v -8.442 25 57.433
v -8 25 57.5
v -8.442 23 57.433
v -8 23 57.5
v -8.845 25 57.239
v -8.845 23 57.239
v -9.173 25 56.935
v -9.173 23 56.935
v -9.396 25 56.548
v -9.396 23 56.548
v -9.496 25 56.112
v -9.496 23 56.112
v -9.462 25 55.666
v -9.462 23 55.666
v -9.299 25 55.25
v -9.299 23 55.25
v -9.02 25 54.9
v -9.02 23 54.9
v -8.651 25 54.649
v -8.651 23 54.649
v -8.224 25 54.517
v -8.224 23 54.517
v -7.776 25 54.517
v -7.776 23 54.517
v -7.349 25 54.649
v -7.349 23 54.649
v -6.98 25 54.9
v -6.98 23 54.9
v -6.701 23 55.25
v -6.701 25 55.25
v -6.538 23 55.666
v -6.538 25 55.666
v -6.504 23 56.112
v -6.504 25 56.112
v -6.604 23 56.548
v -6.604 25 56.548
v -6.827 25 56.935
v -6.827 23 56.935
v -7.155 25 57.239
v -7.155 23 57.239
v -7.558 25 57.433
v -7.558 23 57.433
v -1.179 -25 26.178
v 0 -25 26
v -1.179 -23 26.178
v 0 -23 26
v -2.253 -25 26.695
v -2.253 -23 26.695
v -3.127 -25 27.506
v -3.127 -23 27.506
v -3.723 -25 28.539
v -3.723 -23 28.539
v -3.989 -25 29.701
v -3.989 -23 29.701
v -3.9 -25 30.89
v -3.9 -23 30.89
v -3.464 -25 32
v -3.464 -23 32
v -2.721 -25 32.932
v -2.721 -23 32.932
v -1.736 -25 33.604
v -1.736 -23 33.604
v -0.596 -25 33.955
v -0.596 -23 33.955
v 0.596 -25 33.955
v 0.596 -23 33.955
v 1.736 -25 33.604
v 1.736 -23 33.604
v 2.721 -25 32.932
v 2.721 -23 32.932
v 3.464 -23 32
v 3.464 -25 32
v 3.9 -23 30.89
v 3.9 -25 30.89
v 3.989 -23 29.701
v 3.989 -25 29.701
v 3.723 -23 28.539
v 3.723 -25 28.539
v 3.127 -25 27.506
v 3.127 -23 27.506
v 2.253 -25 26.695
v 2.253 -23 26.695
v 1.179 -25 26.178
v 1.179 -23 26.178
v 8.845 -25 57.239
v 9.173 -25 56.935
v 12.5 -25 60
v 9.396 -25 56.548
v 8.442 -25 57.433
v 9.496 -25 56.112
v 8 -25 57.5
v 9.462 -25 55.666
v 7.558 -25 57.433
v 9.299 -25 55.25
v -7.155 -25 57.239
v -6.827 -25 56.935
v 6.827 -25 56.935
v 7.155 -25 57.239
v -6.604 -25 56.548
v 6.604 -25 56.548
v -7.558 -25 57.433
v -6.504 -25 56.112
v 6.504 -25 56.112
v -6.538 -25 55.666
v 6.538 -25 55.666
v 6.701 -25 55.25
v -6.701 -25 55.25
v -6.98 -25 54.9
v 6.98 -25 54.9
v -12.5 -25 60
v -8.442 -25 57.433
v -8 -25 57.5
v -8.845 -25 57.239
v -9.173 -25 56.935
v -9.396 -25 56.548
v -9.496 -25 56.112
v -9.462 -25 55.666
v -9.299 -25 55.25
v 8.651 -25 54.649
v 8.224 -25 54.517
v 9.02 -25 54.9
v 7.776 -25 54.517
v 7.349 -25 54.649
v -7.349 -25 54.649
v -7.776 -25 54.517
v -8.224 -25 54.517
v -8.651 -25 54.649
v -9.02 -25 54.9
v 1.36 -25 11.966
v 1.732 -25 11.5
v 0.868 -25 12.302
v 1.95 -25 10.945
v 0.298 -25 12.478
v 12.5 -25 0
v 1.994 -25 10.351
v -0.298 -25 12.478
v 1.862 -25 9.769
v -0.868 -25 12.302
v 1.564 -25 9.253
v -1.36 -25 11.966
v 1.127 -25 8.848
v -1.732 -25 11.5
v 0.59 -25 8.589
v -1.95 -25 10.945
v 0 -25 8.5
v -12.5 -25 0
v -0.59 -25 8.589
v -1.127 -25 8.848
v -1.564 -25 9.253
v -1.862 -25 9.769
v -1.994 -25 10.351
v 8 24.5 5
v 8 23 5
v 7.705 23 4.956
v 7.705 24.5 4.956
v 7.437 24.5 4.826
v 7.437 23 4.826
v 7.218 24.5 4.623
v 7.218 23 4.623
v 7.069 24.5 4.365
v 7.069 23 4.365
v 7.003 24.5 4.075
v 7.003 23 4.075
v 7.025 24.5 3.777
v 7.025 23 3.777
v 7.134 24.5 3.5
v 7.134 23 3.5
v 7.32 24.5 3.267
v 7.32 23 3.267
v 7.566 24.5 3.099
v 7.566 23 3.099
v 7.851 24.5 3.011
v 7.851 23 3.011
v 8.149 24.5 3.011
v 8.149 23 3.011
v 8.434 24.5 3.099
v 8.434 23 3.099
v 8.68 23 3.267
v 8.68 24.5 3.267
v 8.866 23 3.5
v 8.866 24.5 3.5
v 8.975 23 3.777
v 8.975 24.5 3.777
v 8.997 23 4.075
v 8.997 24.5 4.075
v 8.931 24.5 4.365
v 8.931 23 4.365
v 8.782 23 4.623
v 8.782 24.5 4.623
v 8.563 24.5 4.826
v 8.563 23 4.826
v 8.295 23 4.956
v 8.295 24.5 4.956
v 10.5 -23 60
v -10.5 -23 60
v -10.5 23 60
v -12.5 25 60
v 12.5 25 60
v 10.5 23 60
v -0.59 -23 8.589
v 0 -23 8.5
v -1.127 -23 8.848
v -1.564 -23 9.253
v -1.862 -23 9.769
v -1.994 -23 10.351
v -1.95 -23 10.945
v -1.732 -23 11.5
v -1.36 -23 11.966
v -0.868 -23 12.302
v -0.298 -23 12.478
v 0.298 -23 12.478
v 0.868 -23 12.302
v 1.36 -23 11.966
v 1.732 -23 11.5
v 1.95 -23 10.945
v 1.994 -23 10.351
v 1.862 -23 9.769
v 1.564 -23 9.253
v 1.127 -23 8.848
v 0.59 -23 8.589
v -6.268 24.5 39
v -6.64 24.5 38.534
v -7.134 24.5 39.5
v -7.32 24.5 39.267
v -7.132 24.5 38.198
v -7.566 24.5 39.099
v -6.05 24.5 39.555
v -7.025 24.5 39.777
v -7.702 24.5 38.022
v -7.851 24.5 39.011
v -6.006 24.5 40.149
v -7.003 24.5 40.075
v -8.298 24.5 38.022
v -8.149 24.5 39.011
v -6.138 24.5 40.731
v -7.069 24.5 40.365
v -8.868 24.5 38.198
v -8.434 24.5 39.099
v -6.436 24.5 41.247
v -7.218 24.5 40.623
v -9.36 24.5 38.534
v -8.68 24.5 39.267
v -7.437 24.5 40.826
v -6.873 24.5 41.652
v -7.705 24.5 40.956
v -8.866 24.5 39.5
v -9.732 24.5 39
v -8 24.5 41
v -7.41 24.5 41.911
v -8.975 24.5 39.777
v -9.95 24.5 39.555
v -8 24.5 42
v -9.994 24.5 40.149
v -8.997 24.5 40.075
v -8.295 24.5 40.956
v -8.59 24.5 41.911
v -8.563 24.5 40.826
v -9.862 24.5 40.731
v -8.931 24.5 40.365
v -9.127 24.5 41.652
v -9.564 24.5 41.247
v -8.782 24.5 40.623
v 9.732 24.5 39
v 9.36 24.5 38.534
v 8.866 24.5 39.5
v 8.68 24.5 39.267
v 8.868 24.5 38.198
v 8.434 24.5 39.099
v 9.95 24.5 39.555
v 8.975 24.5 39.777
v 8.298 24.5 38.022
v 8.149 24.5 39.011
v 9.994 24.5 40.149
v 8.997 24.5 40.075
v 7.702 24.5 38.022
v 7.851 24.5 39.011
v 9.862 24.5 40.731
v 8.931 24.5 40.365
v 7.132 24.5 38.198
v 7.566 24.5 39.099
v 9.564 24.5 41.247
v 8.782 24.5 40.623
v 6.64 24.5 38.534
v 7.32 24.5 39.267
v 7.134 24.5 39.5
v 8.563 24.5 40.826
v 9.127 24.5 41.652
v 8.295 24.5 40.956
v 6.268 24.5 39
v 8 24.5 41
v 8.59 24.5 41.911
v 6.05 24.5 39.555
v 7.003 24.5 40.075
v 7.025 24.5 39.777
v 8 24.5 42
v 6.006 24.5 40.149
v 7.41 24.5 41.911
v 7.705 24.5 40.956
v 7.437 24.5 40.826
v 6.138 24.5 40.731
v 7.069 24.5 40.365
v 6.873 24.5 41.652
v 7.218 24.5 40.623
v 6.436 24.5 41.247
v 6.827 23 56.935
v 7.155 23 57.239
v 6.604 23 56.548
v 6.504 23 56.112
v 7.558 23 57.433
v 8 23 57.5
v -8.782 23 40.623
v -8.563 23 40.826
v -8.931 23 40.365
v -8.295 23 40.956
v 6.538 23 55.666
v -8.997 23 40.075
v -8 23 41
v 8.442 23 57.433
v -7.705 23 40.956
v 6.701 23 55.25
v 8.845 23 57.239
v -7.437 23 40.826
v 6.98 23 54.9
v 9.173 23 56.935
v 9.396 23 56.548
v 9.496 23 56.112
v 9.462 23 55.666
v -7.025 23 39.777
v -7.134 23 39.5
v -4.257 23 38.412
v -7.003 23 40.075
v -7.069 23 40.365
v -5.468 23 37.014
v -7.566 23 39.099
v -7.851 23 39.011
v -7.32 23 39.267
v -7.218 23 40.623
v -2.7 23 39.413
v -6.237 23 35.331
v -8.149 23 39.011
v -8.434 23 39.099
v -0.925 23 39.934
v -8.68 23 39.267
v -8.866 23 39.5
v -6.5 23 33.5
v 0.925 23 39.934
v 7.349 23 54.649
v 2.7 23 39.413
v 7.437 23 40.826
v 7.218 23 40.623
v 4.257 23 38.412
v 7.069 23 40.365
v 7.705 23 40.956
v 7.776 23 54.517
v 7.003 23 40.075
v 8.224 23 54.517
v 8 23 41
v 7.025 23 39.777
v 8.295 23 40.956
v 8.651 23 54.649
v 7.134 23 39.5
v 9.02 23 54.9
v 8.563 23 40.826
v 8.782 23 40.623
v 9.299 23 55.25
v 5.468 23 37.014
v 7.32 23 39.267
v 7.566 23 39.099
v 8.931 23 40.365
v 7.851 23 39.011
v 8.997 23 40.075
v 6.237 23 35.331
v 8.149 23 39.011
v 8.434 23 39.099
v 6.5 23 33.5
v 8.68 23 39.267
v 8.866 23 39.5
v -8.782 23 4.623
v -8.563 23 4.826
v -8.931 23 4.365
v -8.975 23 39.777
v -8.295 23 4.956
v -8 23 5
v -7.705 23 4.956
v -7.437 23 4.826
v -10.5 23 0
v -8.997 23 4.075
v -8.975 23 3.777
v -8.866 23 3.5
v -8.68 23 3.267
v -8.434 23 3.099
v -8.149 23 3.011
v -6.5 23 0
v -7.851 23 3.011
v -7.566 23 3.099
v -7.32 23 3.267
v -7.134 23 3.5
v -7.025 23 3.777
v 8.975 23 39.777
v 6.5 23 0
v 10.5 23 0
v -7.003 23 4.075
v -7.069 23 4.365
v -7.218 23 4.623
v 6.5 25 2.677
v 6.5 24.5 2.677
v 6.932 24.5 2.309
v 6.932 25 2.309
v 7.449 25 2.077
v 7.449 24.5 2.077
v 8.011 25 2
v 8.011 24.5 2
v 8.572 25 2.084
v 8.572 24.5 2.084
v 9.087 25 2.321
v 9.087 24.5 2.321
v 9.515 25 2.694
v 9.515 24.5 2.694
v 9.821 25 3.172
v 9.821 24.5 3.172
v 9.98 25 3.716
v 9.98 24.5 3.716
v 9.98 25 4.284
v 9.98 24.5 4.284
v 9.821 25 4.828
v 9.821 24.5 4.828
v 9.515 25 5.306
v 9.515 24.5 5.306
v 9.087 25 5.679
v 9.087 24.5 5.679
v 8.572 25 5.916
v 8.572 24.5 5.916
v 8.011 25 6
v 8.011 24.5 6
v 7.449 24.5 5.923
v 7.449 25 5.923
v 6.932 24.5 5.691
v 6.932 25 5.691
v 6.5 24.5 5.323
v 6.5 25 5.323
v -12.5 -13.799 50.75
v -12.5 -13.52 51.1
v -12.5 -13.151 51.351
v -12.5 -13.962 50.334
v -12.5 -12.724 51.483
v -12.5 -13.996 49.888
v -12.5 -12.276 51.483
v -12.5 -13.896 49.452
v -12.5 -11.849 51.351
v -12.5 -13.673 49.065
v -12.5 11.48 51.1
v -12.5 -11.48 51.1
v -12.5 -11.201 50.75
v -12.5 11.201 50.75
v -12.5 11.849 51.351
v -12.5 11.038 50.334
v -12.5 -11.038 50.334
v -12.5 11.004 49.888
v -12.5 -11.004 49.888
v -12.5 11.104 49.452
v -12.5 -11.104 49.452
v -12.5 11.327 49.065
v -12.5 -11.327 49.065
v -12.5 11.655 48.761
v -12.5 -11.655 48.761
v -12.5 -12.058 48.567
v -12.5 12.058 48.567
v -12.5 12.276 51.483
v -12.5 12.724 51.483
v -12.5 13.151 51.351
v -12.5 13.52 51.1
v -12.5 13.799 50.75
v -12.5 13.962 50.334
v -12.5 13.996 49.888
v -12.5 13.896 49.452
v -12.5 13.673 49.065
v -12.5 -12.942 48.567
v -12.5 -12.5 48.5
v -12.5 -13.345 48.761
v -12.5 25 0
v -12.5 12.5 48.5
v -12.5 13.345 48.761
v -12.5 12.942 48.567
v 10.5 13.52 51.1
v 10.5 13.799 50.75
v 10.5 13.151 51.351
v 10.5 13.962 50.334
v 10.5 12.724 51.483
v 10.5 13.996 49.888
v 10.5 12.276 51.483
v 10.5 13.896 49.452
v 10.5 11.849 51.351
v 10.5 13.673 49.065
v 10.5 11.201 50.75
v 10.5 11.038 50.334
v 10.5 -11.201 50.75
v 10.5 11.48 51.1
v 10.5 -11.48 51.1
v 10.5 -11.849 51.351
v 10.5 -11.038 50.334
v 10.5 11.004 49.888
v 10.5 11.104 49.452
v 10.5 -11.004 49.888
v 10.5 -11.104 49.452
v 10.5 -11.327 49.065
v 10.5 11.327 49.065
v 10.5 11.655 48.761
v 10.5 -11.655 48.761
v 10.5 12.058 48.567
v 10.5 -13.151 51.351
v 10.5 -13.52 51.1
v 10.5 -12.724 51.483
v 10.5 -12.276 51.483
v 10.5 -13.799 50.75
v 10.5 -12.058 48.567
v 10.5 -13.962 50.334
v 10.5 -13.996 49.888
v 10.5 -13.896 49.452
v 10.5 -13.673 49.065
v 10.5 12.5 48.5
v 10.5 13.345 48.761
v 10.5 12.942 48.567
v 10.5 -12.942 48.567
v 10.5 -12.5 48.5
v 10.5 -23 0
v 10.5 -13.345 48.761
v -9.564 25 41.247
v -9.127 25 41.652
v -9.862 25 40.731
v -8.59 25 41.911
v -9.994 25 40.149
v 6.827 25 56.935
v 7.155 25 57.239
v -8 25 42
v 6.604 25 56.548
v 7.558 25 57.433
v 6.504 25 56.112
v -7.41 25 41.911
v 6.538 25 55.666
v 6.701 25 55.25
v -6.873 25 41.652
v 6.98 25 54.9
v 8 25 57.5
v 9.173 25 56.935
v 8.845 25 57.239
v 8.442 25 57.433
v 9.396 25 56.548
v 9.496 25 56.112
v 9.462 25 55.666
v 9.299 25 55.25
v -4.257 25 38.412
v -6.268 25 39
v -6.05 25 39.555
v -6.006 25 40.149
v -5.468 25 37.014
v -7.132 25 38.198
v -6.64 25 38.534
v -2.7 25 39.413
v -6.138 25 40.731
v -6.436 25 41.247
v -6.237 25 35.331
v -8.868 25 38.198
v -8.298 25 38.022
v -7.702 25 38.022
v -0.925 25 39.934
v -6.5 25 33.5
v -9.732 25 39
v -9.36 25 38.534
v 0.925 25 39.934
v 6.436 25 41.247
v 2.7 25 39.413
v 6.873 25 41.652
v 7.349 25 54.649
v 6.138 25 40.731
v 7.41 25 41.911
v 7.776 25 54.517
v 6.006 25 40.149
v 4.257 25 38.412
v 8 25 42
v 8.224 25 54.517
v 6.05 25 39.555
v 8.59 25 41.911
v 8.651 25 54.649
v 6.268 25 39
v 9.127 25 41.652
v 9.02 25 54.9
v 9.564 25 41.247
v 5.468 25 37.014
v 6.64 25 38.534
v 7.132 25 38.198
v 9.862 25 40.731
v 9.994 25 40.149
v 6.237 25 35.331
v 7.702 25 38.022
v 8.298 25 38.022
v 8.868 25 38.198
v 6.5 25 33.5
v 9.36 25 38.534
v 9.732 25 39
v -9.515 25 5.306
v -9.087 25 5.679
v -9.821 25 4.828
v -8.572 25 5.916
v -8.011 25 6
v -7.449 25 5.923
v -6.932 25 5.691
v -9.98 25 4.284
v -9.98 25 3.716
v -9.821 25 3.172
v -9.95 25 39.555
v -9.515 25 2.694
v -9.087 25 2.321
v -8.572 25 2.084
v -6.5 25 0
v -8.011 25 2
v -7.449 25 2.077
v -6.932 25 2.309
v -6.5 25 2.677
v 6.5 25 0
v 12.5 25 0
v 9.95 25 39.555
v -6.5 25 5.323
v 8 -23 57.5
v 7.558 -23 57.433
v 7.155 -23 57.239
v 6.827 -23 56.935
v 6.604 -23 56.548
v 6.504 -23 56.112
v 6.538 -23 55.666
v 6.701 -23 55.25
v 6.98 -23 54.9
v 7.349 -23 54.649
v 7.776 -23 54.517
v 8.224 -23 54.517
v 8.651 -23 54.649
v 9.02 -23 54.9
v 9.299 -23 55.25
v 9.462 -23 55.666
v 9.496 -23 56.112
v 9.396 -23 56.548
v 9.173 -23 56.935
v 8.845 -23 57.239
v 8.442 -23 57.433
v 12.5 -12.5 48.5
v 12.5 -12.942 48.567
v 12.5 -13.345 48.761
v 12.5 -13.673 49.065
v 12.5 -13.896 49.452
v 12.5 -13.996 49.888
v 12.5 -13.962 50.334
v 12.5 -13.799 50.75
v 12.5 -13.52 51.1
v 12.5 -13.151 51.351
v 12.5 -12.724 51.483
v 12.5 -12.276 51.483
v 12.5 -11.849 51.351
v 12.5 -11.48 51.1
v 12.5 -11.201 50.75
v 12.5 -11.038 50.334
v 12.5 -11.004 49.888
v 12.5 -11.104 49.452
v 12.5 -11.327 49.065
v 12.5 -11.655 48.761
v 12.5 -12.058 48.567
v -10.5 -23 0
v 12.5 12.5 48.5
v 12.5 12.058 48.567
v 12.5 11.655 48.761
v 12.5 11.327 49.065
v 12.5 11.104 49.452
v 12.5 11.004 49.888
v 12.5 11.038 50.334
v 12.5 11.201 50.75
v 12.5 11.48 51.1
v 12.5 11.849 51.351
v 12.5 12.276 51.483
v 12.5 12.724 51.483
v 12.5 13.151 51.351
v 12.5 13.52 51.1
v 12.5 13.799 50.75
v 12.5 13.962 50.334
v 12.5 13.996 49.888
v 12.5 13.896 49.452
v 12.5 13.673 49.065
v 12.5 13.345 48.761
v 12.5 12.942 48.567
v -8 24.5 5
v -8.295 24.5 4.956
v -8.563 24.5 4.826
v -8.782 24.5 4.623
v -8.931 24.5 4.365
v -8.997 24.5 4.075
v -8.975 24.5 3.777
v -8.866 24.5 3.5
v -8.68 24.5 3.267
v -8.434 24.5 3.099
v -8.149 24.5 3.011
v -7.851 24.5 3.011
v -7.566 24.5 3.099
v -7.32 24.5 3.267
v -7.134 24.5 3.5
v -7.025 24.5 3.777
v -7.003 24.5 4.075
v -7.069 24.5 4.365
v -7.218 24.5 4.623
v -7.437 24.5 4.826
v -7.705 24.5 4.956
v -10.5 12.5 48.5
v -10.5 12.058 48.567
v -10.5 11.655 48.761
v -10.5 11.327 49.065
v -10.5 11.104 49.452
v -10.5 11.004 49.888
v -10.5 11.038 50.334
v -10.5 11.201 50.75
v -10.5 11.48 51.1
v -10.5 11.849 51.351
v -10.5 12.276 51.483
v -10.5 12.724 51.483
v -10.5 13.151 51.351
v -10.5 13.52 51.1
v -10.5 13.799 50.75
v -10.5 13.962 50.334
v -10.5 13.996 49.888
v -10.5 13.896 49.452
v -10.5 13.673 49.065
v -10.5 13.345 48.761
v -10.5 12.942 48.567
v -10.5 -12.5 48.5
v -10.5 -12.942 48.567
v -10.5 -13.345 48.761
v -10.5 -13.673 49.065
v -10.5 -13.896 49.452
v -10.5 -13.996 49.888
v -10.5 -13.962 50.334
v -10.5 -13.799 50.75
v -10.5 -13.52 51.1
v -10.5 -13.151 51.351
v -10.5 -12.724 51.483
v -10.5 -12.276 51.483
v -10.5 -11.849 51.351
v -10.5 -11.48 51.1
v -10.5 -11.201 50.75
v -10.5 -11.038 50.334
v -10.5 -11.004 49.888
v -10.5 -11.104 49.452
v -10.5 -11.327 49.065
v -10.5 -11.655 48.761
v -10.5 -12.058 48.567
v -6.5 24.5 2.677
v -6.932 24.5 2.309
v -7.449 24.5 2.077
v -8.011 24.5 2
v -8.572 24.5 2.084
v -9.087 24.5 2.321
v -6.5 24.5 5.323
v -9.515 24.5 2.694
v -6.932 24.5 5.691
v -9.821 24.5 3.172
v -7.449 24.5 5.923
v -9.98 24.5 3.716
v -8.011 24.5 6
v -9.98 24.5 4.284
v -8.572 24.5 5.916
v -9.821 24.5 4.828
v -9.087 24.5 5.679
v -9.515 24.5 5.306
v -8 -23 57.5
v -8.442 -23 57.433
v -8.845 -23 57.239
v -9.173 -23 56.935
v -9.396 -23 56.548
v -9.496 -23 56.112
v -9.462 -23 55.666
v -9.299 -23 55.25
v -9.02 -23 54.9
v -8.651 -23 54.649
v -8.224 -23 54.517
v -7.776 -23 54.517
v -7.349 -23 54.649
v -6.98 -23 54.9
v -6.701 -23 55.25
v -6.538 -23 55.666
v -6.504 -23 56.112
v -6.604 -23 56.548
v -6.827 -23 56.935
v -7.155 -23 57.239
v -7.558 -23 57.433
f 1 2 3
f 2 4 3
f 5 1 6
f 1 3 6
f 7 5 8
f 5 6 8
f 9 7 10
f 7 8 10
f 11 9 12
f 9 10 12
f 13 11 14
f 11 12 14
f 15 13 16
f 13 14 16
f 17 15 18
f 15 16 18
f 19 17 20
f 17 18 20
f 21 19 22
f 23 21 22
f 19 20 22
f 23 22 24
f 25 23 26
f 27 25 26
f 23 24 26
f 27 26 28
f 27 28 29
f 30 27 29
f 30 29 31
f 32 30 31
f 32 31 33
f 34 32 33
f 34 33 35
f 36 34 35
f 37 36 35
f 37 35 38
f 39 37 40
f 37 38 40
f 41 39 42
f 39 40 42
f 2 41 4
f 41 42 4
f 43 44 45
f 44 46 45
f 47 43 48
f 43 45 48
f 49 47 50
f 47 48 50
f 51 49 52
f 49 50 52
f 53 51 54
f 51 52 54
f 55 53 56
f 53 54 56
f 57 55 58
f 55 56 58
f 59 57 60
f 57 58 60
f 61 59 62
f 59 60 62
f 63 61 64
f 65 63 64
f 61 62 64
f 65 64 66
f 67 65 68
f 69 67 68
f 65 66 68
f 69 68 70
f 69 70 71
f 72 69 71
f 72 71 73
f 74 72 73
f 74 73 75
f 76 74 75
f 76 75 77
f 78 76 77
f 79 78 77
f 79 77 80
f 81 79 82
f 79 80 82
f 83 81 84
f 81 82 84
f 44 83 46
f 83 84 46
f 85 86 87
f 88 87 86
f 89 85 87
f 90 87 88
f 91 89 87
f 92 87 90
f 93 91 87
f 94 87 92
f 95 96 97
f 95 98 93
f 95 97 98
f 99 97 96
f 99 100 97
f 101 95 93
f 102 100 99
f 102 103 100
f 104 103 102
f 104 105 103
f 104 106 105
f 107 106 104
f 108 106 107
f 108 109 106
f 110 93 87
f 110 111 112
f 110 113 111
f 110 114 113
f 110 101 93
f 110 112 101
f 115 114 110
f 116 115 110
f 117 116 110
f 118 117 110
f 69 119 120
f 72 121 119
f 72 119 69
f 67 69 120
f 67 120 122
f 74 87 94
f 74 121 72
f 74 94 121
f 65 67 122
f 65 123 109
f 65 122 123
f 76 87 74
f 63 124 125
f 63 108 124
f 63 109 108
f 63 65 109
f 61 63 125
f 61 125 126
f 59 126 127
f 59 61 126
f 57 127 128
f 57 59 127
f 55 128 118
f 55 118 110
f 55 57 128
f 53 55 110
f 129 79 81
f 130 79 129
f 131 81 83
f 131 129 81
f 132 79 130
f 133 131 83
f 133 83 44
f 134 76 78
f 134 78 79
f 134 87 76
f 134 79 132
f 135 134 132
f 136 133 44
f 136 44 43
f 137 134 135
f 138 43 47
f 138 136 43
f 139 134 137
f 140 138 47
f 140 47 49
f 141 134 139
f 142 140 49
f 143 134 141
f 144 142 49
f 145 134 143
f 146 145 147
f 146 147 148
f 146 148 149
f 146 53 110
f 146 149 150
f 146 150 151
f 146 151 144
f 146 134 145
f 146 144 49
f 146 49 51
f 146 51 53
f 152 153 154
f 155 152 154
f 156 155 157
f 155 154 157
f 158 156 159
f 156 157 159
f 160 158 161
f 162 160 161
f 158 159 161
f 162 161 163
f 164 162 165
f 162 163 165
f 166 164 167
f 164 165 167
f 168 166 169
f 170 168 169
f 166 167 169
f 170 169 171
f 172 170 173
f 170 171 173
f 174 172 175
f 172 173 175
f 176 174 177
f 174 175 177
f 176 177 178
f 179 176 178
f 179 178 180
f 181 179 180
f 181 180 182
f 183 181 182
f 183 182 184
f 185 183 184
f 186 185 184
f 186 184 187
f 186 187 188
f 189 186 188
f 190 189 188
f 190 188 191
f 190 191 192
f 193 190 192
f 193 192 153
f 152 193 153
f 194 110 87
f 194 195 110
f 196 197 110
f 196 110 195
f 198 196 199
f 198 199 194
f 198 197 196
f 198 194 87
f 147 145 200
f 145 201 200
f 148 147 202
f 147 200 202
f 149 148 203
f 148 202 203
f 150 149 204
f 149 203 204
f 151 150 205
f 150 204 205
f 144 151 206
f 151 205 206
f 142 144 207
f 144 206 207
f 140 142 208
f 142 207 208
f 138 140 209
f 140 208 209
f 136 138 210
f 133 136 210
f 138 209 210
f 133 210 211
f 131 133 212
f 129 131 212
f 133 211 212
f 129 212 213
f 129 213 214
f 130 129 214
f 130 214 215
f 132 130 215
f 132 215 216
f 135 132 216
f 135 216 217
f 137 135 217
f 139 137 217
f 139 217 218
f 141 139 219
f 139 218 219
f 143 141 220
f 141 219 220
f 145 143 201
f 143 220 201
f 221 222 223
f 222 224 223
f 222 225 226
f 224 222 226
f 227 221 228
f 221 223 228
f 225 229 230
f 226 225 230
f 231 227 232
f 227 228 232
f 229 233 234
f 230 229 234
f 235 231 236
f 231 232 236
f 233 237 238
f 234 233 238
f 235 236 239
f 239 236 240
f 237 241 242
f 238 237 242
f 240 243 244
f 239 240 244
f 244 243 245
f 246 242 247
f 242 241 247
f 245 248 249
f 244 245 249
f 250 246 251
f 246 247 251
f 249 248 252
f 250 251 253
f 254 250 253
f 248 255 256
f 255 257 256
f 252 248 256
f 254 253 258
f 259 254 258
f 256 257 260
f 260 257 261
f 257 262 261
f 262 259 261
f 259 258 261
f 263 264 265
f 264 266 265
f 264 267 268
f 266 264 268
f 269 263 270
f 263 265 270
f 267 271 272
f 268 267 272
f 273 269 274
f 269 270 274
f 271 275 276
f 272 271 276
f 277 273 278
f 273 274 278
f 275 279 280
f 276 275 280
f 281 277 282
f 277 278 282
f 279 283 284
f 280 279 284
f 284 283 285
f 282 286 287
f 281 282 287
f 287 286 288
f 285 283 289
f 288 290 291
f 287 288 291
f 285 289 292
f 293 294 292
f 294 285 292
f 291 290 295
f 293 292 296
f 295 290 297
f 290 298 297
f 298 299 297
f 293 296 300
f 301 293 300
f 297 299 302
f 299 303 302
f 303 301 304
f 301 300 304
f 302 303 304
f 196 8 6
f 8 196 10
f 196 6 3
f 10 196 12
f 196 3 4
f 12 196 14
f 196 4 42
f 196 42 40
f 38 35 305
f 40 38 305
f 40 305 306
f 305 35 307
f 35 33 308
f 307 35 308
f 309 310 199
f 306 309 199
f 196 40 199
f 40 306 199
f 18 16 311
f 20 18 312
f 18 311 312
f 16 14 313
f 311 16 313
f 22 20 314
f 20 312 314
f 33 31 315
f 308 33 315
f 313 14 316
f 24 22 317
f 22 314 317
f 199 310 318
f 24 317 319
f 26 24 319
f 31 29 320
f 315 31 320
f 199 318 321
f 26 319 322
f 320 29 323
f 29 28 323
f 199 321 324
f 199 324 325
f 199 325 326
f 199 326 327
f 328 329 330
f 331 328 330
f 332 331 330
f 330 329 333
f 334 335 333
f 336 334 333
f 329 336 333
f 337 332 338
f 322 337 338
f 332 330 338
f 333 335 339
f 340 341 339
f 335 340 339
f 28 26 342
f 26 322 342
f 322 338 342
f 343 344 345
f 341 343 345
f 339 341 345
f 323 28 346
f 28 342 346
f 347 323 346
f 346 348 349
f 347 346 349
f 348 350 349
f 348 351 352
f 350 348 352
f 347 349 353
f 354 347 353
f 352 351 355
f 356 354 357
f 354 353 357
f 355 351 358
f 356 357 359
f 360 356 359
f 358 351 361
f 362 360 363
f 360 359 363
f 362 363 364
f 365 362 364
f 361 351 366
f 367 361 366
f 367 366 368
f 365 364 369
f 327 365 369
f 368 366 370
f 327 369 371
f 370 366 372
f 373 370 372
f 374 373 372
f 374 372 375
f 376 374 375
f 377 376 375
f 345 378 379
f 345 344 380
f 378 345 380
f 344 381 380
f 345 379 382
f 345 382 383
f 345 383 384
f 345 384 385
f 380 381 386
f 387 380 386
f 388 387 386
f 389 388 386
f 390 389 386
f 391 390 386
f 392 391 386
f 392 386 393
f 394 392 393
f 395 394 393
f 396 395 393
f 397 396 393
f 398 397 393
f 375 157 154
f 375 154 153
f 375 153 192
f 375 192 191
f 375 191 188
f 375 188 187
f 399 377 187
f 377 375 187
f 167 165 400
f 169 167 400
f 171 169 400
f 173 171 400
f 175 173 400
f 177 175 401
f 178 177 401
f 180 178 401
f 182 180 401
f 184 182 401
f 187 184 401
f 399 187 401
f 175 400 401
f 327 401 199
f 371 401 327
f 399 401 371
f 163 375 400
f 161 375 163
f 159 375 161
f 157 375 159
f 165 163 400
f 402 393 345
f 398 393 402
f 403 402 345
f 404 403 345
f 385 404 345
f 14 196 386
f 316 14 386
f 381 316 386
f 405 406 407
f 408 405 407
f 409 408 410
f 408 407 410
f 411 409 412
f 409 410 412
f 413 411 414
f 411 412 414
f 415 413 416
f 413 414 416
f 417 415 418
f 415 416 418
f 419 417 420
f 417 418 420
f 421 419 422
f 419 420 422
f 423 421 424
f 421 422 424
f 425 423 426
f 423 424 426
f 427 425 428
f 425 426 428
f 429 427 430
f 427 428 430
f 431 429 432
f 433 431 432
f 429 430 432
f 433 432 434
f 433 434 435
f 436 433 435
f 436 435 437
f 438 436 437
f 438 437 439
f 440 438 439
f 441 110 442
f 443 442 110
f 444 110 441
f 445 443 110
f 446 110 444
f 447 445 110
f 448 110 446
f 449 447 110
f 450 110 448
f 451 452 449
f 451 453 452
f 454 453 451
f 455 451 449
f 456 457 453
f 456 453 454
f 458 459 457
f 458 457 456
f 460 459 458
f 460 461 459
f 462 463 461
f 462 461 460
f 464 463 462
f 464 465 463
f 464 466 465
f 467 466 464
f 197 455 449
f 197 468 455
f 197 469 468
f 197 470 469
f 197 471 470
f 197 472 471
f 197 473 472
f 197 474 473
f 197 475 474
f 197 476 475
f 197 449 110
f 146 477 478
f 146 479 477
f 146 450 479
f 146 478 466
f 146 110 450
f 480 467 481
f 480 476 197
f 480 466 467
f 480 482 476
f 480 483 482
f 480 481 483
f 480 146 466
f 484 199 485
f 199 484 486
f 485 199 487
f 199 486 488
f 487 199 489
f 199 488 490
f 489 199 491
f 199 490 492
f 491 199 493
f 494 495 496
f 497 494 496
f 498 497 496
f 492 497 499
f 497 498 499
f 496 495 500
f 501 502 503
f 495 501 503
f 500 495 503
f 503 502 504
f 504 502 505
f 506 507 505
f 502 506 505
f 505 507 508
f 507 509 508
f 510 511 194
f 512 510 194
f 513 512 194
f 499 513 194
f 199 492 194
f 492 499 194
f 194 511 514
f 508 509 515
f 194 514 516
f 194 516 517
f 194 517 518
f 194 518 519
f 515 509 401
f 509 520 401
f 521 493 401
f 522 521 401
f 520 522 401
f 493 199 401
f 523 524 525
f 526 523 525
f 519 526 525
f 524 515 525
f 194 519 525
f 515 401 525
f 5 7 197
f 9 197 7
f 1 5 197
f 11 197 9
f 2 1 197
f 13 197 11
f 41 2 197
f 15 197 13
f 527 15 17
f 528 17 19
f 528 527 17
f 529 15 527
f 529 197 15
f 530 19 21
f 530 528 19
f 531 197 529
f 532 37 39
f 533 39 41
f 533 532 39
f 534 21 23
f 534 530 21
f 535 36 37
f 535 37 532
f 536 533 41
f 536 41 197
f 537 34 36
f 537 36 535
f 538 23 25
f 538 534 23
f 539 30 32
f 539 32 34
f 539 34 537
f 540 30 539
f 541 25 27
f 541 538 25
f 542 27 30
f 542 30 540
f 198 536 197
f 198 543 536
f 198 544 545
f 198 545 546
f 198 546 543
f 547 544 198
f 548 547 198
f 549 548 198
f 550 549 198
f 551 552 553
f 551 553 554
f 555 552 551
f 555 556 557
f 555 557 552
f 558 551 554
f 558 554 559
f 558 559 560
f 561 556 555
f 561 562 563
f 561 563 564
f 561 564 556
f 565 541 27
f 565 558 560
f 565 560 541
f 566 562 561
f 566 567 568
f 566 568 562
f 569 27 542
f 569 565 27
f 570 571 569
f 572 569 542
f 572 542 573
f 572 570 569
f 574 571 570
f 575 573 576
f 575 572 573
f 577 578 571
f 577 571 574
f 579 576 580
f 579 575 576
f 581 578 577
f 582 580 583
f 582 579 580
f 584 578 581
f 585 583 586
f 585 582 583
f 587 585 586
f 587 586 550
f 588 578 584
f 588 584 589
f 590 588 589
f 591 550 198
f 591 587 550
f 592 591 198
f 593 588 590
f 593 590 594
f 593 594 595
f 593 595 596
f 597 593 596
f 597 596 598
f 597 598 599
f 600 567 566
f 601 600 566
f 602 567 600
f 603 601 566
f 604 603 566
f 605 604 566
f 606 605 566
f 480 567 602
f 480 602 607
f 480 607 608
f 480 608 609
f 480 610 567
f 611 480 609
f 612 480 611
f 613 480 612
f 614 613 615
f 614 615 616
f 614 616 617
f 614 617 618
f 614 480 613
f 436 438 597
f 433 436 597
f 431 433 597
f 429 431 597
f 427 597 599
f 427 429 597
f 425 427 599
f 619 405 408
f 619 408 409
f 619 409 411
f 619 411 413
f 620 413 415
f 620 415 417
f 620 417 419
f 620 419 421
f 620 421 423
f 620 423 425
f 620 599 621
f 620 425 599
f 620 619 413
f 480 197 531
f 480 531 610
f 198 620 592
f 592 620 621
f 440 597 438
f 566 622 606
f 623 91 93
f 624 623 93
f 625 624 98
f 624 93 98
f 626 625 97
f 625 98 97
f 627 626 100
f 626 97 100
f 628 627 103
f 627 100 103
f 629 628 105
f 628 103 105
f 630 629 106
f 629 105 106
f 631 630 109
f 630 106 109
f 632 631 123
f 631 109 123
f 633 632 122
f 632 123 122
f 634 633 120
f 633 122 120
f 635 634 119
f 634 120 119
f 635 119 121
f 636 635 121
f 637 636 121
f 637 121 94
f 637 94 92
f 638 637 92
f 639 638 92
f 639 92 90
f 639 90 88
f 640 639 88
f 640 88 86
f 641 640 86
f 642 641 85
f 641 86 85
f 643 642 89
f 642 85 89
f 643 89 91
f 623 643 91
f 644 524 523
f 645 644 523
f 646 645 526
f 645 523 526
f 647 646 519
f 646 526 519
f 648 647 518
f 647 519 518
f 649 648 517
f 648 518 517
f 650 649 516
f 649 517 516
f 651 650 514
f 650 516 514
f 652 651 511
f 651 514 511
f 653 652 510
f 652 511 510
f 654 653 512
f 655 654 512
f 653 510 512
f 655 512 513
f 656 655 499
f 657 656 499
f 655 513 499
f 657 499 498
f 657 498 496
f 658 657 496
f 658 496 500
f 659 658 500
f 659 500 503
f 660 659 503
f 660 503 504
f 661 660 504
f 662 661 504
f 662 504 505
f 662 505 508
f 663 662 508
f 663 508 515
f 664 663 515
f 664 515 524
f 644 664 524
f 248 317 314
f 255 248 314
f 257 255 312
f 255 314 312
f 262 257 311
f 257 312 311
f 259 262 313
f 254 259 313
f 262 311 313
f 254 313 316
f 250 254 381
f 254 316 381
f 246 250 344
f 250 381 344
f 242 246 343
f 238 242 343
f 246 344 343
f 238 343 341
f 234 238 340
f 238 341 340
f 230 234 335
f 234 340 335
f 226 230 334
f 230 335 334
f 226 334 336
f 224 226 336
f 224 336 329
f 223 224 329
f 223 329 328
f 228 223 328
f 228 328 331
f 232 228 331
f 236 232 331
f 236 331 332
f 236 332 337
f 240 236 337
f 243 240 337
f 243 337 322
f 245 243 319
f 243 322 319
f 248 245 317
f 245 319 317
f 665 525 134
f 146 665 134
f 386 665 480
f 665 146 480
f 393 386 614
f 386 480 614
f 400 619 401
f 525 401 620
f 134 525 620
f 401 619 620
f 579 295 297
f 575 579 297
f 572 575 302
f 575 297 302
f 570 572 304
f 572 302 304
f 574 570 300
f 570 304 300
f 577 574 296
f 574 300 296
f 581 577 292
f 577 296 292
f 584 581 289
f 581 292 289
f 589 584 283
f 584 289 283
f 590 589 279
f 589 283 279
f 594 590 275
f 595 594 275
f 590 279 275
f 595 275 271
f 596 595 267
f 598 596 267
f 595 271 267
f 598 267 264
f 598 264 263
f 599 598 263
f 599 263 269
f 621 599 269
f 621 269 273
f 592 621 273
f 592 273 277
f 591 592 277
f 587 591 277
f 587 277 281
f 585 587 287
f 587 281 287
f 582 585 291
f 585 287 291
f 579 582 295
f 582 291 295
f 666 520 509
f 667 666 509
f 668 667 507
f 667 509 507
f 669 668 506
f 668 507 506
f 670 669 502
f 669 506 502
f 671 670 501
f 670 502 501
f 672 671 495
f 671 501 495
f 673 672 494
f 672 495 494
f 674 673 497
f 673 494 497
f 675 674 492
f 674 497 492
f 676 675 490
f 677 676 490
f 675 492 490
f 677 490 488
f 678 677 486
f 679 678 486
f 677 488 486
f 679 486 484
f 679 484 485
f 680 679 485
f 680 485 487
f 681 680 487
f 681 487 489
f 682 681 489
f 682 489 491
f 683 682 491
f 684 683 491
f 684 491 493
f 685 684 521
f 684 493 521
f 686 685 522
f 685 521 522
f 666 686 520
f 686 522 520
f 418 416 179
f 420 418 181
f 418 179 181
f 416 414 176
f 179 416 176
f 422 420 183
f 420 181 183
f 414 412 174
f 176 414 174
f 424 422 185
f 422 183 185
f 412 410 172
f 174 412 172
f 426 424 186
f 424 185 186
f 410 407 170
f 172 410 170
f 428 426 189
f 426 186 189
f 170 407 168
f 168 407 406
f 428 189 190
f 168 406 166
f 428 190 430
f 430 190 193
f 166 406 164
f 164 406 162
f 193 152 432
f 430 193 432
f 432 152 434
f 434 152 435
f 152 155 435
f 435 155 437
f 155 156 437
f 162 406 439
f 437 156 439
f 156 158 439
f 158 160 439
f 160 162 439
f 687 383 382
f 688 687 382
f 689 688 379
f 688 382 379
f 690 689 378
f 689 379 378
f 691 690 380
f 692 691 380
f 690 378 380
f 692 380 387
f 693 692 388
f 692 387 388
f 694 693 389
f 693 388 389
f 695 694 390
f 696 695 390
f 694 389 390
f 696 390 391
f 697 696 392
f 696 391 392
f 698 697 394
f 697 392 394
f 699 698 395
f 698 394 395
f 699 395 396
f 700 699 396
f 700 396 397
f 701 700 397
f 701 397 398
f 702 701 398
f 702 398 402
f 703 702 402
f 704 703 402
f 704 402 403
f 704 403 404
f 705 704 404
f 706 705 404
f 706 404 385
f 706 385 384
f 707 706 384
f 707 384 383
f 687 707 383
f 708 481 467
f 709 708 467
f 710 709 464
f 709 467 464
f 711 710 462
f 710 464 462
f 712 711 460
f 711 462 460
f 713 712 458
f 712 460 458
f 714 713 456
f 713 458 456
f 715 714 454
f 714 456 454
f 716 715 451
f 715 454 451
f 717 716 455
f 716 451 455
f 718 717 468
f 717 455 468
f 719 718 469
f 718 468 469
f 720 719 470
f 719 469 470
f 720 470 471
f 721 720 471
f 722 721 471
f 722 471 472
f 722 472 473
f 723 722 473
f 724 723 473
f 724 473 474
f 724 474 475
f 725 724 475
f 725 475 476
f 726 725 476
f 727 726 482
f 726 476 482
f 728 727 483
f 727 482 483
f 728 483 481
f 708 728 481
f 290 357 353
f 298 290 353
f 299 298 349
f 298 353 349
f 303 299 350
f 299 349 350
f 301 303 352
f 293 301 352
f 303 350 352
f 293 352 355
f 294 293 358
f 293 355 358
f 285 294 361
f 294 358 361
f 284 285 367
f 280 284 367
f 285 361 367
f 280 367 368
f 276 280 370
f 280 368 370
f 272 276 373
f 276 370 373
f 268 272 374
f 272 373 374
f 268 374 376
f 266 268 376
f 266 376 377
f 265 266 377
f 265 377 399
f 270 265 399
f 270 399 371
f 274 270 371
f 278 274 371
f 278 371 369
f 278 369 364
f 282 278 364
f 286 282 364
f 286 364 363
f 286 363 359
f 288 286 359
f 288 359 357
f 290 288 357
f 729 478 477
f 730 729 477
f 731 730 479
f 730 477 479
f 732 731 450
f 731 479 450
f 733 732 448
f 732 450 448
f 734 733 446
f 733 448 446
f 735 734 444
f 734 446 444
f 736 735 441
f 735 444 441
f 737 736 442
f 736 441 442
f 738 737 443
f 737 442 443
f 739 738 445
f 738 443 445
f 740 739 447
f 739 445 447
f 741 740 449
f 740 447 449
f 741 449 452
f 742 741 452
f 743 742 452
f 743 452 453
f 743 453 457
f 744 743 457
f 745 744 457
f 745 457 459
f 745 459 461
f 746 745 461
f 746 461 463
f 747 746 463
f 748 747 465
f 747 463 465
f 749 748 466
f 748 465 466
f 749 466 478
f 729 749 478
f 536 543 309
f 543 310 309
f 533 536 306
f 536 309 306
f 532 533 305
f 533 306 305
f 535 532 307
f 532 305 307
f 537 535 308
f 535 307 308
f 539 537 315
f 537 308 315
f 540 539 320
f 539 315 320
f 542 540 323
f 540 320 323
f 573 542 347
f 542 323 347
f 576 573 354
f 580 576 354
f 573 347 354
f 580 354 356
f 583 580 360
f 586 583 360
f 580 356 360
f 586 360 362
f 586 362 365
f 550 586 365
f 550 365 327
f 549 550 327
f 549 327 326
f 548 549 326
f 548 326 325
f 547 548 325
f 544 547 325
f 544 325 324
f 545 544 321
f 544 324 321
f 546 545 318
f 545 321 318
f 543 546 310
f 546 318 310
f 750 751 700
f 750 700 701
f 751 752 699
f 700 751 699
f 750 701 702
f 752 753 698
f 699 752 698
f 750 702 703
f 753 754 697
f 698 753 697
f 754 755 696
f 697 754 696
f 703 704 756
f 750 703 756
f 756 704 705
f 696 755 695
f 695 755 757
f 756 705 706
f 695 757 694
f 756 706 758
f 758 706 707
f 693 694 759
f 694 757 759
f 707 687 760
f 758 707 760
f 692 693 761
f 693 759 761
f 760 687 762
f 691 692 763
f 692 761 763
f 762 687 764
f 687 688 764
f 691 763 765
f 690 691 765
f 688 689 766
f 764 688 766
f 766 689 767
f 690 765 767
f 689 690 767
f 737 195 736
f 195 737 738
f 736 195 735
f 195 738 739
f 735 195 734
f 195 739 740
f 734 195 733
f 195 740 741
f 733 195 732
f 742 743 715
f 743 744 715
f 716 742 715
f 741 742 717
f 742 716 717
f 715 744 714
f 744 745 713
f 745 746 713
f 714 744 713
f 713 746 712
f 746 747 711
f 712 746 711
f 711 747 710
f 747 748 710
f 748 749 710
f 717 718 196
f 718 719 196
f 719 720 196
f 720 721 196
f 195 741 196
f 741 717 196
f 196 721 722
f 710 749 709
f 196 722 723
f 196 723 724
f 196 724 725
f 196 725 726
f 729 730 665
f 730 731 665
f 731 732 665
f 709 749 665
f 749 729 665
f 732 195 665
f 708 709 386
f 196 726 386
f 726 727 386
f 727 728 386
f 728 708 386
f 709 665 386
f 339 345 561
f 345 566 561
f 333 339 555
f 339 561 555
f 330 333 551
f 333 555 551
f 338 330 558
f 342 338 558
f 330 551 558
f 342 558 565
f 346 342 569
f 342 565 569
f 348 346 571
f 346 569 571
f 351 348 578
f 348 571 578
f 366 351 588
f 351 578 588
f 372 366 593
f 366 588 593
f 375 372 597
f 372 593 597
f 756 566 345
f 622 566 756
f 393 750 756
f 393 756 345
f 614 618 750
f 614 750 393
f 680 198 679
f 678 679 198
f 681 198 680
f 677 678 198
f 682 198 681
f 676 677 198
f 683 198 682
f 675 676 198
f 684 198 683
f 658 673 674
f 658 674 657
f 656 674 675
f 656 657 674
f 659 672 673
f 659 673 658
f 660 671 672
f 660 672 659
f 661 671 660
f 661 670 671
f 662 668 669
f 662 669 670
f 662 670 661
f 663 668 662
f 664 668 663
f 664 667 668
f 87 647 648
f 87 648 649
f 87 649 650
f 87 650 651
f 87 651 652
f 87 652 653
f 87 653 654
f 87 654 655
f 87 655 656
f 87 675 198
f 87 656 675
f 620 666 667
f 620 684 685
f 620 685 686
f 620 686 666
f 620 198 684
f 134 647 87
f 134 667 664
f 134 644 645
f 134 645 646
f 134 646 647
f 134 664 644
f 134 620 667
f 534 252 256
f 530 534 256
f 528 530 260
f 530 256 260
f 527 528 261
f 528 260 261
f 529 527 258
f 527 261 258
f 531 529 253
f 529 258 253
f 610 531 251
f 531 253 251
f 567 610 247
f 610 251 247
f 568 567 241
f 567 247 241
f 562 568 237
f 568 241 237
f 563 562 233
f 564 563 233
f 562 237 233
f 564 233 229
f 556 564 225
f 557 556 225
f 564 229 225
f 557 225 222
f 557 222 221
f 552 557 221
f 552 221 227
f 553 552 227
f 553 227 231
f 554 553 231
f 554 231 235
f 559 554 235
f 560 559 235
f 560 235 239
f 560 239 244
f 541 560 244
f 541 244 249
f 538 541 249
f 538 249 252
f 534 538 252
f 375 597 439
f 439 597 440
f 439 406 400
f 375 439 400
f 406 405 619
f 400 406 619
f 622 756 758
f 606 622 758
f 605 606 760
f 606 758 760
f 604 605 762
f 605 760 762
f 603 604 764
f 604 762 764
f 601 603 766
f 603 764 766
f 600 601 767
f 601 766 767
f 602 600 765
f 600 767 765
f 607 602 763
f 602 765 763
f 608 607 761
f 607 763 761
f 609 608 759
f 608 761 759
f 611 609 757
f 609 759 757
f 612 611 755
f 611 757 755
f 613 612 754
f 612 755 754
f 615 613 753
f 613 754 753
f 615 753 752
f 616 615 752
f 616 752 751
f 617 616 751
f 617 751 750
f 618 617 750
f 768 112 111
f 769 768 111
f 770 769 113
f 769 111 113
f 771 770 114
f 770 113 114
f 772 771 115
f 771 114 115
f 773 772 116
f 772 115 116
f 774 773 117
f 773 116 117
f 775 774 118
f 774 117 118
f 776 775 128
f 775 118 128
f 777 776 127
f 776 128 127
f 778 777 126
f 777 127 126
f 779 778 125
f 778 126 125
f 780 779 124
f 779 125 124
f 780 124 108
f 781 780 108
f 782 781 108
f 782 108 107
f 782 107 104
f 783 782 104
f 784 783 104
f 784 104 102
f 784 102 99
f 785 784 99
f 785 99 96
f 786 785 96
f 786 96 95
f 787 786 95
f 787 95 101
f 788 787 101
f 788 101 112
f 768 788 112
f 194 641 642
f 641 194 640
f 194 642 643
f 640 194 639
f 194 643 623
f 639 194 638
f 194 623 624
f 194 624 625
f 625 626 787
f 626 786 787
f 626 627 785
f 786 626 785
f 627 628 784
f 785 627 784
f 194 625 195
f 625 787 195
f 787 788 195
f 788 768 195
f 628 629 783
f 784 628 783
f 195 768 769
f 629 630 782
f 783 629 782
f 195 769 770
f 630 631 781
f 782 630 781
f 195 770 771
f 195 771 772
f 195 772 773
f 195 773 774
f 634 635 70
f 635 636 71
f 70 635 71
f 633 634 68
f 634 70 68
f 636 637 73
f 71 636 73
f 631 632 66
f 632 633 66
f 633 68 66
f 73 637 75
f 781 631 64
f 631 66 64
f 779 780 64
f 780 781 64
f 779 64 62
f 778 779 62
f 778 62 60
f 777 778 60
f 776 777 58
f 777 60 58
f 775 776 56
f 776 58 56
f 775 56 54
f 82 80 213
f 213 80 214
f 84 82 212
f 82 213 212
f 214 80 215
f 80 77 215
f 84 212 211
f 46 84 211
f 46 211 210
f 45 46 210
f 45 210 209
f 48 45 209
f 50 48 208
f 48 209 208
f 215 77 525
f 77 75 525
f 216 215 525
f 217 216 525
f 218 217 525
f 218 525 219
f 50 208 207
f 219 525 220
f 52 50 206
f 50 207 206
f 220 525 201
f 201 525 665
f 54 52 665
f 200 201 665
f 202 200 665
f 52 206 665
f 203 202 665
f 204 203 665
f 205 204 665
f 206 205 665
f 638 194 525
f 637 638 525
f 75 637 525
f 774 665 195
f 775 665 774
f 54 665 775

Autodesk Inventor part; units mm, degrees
ref_plane "YZ Plane" through (0, 0, 0) normal (1, 0, 0) x (0, 1, 0)
ref_plane "XZ Plane" through (0, 0, 0) normal (0, 1, 0) x (-1, 0, 0)
ref_plane "XY Plane" through (0, 0, 0) normal (0, 0, 1) x (1, 0, 0)
sketch "スケッチ1" plane through (0, 0, 0) normal (0, 0, 1) x (1, 0, 0)
  line L0 (-12.5, 25) -> (12.5, 25)
  line L1 (12.5, 25) -> (12.5, -25)
  line L2 (12.5, -25) -> (-12.5, -25)
  line L3 (-12.5, -25) -> (-12.5, 25)
  line L4 (-10.5, 23) -> (10.5, 23)
  line L5 (10.5, 23) -> (10.5, -23)
  line L6 (10.5, -23) -> (-10.5, -23)
  line L7 (-10.5, -23) -> (-10.5, 23)
  point P0 (0, 0)
  dimension "d0" = 25
  dimension "d1" = 50
  dimension "d2" = 46
  dimension "d3" = 21
  dimension "d4" = 25
  dimension "d5" = 23
  dimension "d6" = 10.5
  dimension "d7" = 12.5
extrude "押し出し1" add sketch "スケッチ1" along normal blind 60
sketch "スケッチ2" plane through (-12.5, 25, 0) normal (0, 1, 0) x (1, 0, 0)
  line L0 (0, 0) -> (25, 0) projected
  line L1 (0, 0) -> (0, -60) projected
  arc A0 (6, -33.5) -> (19, -33.5) centre (12.5, -33.5) ccw
  line L2 (6, -33.5) -> (6, 0)
  line L3 (19, -33.5) -> (19, 0)
  point P0 (12.5, 0)
  dimension "d10" = 13
  dimension "d11" = 33.5
  dimension "d12" = 12.5
extrude "押し出し2" cut sketch "スケッチ2" against normal blind 2
sketch "スケッチ3" plane through (-12.5, 25, 60) normal (0, 1, 0) x (1, 0, 0)
  arc A0 (6, 26.5) -> (19, 26.5) centre (12.5, 26.5) ccw projected
  circle A1 centre (4.5, 20) radius 1
  circle A2 centre (4.5, 56) radius 1
  circle A3 centre (20.5, 56) radius 1
  circle A4 centre (20.5, 20) radius 1
  point P0 (12.5, 60)
  dimension "d15" = 6.5
  dimension "d16" = 6.5
  dimension "d17" = 2
  dimension "d18" = 8
  dimension "d19" = 8
  dimension "d20" = 8
  dimension "d21" = 8
  dimension "d22" = 29.5
  dimension "d23" = 29.5
hole "穴1" at (-8, 25, 4) at (8, 25, 4) at (8, 25, 40) at (-8, 25, 40) direction (0, -1, 0) diameter 2 depth 2 tip angle 118 counterbore diameter 4 counterbore depth 0.5
sketch "スケッチ4" plane through (-12.5, -25, 0) normal (0, -1, 0) x (1, 0, 0)
  line L0 (25, 0) -> (0, 0) projected
  line L1 (25, 0) -> (25, 60) projected
  circle A0 centre (12.5, 10.5) radius 2
  point P0 (12.5, 0)
  dimension "d31" = 4
  dimension "d32" = 12.5
  dimension "d33" = 10.5
hole "穴2" at (0, -25, 10.5) direction (0, 1, 0) diameter 4 end through all
sketch "スケッチ5" plane through (-12.5, 25, 60) normal (0, 1, 0) x (1, 0, 0)
  line L0 (0, 0) -> (25, 0) projected
  arc A0 (6, 26.5) -> (19, 26.5) centre (12.5, 26.5) ccw projected
  circle A1 centre (20.5, 4) radius 1.5
  circle A2 centre (4.5, 4) radius 1.5
  point P0 (12.5, 60)
  dimension "d43" = 4
  dimension "d44" = 4
  dimension "d46" = 8
  dimension "d47" = 8
  dimension "d57" = 3
hole "穴4" at (-8, 25, 56) at (8, 25, 56) direction (0, -1, 0) diameter 3 end through all
thread "ねじ1" size "M3x0.5" class "6H" standard "ANSI Metric M Profile" full length
thread "ねじ2" size "M3x0.5" class "6H" standard "ANSI Metric M Profile" full length
thread "ねじ3" size "M3x0.5" class "6H" standard "ANSI Metric M Profile" full length
thread "ねじ4" size "M3x0.5" class "6H" standard "ANSI Metric M Profile" full length
sketch "スケッチ7" plane through (-12.5, -25, 0) normal (0, -1, 0) x (1, 0, 0)
  line L0 (25, 60) -> (0, 60) projected
  line L1 (25, 0) -> (25, 60) projected
  circle A0 centre (12.5, 30) radius 4
  point P0 (12.5, 0)
  dimension "d78" = 30
  dimension "d79" = 8
  dimension "d80" = 12.5
hole "穴5" at (0, -25, 30) direction (0, 1, 0) diameter 8 end through all
sketch "スケッチ8" plane through (12.5, -25, 0) normal (1, 0, 0) x (0, 0, -1)
  line L0 (-60, 50) -> (-60, 0) projected
  line L1 (0, 0) -> (-60, 0) projected
  circle A0 centre (-50, 37.5) radius 1.5
  circle A1 centre (-50, 12.5) radius 1.5
  point P0 (0, 25)
  dimension "d88" = 25
  dimension "d90" = 3
  dimension "d91" = 10
  dimension "d92" = 10
  dimension "d93" = 12.5
hole "穴6" at (12.5, -12.5, 50) at (12.5, 12.5, 50) direction (-1, 0, 0) diameter 3 end through all
properties part number "07" material "アルミニウム 6061"
